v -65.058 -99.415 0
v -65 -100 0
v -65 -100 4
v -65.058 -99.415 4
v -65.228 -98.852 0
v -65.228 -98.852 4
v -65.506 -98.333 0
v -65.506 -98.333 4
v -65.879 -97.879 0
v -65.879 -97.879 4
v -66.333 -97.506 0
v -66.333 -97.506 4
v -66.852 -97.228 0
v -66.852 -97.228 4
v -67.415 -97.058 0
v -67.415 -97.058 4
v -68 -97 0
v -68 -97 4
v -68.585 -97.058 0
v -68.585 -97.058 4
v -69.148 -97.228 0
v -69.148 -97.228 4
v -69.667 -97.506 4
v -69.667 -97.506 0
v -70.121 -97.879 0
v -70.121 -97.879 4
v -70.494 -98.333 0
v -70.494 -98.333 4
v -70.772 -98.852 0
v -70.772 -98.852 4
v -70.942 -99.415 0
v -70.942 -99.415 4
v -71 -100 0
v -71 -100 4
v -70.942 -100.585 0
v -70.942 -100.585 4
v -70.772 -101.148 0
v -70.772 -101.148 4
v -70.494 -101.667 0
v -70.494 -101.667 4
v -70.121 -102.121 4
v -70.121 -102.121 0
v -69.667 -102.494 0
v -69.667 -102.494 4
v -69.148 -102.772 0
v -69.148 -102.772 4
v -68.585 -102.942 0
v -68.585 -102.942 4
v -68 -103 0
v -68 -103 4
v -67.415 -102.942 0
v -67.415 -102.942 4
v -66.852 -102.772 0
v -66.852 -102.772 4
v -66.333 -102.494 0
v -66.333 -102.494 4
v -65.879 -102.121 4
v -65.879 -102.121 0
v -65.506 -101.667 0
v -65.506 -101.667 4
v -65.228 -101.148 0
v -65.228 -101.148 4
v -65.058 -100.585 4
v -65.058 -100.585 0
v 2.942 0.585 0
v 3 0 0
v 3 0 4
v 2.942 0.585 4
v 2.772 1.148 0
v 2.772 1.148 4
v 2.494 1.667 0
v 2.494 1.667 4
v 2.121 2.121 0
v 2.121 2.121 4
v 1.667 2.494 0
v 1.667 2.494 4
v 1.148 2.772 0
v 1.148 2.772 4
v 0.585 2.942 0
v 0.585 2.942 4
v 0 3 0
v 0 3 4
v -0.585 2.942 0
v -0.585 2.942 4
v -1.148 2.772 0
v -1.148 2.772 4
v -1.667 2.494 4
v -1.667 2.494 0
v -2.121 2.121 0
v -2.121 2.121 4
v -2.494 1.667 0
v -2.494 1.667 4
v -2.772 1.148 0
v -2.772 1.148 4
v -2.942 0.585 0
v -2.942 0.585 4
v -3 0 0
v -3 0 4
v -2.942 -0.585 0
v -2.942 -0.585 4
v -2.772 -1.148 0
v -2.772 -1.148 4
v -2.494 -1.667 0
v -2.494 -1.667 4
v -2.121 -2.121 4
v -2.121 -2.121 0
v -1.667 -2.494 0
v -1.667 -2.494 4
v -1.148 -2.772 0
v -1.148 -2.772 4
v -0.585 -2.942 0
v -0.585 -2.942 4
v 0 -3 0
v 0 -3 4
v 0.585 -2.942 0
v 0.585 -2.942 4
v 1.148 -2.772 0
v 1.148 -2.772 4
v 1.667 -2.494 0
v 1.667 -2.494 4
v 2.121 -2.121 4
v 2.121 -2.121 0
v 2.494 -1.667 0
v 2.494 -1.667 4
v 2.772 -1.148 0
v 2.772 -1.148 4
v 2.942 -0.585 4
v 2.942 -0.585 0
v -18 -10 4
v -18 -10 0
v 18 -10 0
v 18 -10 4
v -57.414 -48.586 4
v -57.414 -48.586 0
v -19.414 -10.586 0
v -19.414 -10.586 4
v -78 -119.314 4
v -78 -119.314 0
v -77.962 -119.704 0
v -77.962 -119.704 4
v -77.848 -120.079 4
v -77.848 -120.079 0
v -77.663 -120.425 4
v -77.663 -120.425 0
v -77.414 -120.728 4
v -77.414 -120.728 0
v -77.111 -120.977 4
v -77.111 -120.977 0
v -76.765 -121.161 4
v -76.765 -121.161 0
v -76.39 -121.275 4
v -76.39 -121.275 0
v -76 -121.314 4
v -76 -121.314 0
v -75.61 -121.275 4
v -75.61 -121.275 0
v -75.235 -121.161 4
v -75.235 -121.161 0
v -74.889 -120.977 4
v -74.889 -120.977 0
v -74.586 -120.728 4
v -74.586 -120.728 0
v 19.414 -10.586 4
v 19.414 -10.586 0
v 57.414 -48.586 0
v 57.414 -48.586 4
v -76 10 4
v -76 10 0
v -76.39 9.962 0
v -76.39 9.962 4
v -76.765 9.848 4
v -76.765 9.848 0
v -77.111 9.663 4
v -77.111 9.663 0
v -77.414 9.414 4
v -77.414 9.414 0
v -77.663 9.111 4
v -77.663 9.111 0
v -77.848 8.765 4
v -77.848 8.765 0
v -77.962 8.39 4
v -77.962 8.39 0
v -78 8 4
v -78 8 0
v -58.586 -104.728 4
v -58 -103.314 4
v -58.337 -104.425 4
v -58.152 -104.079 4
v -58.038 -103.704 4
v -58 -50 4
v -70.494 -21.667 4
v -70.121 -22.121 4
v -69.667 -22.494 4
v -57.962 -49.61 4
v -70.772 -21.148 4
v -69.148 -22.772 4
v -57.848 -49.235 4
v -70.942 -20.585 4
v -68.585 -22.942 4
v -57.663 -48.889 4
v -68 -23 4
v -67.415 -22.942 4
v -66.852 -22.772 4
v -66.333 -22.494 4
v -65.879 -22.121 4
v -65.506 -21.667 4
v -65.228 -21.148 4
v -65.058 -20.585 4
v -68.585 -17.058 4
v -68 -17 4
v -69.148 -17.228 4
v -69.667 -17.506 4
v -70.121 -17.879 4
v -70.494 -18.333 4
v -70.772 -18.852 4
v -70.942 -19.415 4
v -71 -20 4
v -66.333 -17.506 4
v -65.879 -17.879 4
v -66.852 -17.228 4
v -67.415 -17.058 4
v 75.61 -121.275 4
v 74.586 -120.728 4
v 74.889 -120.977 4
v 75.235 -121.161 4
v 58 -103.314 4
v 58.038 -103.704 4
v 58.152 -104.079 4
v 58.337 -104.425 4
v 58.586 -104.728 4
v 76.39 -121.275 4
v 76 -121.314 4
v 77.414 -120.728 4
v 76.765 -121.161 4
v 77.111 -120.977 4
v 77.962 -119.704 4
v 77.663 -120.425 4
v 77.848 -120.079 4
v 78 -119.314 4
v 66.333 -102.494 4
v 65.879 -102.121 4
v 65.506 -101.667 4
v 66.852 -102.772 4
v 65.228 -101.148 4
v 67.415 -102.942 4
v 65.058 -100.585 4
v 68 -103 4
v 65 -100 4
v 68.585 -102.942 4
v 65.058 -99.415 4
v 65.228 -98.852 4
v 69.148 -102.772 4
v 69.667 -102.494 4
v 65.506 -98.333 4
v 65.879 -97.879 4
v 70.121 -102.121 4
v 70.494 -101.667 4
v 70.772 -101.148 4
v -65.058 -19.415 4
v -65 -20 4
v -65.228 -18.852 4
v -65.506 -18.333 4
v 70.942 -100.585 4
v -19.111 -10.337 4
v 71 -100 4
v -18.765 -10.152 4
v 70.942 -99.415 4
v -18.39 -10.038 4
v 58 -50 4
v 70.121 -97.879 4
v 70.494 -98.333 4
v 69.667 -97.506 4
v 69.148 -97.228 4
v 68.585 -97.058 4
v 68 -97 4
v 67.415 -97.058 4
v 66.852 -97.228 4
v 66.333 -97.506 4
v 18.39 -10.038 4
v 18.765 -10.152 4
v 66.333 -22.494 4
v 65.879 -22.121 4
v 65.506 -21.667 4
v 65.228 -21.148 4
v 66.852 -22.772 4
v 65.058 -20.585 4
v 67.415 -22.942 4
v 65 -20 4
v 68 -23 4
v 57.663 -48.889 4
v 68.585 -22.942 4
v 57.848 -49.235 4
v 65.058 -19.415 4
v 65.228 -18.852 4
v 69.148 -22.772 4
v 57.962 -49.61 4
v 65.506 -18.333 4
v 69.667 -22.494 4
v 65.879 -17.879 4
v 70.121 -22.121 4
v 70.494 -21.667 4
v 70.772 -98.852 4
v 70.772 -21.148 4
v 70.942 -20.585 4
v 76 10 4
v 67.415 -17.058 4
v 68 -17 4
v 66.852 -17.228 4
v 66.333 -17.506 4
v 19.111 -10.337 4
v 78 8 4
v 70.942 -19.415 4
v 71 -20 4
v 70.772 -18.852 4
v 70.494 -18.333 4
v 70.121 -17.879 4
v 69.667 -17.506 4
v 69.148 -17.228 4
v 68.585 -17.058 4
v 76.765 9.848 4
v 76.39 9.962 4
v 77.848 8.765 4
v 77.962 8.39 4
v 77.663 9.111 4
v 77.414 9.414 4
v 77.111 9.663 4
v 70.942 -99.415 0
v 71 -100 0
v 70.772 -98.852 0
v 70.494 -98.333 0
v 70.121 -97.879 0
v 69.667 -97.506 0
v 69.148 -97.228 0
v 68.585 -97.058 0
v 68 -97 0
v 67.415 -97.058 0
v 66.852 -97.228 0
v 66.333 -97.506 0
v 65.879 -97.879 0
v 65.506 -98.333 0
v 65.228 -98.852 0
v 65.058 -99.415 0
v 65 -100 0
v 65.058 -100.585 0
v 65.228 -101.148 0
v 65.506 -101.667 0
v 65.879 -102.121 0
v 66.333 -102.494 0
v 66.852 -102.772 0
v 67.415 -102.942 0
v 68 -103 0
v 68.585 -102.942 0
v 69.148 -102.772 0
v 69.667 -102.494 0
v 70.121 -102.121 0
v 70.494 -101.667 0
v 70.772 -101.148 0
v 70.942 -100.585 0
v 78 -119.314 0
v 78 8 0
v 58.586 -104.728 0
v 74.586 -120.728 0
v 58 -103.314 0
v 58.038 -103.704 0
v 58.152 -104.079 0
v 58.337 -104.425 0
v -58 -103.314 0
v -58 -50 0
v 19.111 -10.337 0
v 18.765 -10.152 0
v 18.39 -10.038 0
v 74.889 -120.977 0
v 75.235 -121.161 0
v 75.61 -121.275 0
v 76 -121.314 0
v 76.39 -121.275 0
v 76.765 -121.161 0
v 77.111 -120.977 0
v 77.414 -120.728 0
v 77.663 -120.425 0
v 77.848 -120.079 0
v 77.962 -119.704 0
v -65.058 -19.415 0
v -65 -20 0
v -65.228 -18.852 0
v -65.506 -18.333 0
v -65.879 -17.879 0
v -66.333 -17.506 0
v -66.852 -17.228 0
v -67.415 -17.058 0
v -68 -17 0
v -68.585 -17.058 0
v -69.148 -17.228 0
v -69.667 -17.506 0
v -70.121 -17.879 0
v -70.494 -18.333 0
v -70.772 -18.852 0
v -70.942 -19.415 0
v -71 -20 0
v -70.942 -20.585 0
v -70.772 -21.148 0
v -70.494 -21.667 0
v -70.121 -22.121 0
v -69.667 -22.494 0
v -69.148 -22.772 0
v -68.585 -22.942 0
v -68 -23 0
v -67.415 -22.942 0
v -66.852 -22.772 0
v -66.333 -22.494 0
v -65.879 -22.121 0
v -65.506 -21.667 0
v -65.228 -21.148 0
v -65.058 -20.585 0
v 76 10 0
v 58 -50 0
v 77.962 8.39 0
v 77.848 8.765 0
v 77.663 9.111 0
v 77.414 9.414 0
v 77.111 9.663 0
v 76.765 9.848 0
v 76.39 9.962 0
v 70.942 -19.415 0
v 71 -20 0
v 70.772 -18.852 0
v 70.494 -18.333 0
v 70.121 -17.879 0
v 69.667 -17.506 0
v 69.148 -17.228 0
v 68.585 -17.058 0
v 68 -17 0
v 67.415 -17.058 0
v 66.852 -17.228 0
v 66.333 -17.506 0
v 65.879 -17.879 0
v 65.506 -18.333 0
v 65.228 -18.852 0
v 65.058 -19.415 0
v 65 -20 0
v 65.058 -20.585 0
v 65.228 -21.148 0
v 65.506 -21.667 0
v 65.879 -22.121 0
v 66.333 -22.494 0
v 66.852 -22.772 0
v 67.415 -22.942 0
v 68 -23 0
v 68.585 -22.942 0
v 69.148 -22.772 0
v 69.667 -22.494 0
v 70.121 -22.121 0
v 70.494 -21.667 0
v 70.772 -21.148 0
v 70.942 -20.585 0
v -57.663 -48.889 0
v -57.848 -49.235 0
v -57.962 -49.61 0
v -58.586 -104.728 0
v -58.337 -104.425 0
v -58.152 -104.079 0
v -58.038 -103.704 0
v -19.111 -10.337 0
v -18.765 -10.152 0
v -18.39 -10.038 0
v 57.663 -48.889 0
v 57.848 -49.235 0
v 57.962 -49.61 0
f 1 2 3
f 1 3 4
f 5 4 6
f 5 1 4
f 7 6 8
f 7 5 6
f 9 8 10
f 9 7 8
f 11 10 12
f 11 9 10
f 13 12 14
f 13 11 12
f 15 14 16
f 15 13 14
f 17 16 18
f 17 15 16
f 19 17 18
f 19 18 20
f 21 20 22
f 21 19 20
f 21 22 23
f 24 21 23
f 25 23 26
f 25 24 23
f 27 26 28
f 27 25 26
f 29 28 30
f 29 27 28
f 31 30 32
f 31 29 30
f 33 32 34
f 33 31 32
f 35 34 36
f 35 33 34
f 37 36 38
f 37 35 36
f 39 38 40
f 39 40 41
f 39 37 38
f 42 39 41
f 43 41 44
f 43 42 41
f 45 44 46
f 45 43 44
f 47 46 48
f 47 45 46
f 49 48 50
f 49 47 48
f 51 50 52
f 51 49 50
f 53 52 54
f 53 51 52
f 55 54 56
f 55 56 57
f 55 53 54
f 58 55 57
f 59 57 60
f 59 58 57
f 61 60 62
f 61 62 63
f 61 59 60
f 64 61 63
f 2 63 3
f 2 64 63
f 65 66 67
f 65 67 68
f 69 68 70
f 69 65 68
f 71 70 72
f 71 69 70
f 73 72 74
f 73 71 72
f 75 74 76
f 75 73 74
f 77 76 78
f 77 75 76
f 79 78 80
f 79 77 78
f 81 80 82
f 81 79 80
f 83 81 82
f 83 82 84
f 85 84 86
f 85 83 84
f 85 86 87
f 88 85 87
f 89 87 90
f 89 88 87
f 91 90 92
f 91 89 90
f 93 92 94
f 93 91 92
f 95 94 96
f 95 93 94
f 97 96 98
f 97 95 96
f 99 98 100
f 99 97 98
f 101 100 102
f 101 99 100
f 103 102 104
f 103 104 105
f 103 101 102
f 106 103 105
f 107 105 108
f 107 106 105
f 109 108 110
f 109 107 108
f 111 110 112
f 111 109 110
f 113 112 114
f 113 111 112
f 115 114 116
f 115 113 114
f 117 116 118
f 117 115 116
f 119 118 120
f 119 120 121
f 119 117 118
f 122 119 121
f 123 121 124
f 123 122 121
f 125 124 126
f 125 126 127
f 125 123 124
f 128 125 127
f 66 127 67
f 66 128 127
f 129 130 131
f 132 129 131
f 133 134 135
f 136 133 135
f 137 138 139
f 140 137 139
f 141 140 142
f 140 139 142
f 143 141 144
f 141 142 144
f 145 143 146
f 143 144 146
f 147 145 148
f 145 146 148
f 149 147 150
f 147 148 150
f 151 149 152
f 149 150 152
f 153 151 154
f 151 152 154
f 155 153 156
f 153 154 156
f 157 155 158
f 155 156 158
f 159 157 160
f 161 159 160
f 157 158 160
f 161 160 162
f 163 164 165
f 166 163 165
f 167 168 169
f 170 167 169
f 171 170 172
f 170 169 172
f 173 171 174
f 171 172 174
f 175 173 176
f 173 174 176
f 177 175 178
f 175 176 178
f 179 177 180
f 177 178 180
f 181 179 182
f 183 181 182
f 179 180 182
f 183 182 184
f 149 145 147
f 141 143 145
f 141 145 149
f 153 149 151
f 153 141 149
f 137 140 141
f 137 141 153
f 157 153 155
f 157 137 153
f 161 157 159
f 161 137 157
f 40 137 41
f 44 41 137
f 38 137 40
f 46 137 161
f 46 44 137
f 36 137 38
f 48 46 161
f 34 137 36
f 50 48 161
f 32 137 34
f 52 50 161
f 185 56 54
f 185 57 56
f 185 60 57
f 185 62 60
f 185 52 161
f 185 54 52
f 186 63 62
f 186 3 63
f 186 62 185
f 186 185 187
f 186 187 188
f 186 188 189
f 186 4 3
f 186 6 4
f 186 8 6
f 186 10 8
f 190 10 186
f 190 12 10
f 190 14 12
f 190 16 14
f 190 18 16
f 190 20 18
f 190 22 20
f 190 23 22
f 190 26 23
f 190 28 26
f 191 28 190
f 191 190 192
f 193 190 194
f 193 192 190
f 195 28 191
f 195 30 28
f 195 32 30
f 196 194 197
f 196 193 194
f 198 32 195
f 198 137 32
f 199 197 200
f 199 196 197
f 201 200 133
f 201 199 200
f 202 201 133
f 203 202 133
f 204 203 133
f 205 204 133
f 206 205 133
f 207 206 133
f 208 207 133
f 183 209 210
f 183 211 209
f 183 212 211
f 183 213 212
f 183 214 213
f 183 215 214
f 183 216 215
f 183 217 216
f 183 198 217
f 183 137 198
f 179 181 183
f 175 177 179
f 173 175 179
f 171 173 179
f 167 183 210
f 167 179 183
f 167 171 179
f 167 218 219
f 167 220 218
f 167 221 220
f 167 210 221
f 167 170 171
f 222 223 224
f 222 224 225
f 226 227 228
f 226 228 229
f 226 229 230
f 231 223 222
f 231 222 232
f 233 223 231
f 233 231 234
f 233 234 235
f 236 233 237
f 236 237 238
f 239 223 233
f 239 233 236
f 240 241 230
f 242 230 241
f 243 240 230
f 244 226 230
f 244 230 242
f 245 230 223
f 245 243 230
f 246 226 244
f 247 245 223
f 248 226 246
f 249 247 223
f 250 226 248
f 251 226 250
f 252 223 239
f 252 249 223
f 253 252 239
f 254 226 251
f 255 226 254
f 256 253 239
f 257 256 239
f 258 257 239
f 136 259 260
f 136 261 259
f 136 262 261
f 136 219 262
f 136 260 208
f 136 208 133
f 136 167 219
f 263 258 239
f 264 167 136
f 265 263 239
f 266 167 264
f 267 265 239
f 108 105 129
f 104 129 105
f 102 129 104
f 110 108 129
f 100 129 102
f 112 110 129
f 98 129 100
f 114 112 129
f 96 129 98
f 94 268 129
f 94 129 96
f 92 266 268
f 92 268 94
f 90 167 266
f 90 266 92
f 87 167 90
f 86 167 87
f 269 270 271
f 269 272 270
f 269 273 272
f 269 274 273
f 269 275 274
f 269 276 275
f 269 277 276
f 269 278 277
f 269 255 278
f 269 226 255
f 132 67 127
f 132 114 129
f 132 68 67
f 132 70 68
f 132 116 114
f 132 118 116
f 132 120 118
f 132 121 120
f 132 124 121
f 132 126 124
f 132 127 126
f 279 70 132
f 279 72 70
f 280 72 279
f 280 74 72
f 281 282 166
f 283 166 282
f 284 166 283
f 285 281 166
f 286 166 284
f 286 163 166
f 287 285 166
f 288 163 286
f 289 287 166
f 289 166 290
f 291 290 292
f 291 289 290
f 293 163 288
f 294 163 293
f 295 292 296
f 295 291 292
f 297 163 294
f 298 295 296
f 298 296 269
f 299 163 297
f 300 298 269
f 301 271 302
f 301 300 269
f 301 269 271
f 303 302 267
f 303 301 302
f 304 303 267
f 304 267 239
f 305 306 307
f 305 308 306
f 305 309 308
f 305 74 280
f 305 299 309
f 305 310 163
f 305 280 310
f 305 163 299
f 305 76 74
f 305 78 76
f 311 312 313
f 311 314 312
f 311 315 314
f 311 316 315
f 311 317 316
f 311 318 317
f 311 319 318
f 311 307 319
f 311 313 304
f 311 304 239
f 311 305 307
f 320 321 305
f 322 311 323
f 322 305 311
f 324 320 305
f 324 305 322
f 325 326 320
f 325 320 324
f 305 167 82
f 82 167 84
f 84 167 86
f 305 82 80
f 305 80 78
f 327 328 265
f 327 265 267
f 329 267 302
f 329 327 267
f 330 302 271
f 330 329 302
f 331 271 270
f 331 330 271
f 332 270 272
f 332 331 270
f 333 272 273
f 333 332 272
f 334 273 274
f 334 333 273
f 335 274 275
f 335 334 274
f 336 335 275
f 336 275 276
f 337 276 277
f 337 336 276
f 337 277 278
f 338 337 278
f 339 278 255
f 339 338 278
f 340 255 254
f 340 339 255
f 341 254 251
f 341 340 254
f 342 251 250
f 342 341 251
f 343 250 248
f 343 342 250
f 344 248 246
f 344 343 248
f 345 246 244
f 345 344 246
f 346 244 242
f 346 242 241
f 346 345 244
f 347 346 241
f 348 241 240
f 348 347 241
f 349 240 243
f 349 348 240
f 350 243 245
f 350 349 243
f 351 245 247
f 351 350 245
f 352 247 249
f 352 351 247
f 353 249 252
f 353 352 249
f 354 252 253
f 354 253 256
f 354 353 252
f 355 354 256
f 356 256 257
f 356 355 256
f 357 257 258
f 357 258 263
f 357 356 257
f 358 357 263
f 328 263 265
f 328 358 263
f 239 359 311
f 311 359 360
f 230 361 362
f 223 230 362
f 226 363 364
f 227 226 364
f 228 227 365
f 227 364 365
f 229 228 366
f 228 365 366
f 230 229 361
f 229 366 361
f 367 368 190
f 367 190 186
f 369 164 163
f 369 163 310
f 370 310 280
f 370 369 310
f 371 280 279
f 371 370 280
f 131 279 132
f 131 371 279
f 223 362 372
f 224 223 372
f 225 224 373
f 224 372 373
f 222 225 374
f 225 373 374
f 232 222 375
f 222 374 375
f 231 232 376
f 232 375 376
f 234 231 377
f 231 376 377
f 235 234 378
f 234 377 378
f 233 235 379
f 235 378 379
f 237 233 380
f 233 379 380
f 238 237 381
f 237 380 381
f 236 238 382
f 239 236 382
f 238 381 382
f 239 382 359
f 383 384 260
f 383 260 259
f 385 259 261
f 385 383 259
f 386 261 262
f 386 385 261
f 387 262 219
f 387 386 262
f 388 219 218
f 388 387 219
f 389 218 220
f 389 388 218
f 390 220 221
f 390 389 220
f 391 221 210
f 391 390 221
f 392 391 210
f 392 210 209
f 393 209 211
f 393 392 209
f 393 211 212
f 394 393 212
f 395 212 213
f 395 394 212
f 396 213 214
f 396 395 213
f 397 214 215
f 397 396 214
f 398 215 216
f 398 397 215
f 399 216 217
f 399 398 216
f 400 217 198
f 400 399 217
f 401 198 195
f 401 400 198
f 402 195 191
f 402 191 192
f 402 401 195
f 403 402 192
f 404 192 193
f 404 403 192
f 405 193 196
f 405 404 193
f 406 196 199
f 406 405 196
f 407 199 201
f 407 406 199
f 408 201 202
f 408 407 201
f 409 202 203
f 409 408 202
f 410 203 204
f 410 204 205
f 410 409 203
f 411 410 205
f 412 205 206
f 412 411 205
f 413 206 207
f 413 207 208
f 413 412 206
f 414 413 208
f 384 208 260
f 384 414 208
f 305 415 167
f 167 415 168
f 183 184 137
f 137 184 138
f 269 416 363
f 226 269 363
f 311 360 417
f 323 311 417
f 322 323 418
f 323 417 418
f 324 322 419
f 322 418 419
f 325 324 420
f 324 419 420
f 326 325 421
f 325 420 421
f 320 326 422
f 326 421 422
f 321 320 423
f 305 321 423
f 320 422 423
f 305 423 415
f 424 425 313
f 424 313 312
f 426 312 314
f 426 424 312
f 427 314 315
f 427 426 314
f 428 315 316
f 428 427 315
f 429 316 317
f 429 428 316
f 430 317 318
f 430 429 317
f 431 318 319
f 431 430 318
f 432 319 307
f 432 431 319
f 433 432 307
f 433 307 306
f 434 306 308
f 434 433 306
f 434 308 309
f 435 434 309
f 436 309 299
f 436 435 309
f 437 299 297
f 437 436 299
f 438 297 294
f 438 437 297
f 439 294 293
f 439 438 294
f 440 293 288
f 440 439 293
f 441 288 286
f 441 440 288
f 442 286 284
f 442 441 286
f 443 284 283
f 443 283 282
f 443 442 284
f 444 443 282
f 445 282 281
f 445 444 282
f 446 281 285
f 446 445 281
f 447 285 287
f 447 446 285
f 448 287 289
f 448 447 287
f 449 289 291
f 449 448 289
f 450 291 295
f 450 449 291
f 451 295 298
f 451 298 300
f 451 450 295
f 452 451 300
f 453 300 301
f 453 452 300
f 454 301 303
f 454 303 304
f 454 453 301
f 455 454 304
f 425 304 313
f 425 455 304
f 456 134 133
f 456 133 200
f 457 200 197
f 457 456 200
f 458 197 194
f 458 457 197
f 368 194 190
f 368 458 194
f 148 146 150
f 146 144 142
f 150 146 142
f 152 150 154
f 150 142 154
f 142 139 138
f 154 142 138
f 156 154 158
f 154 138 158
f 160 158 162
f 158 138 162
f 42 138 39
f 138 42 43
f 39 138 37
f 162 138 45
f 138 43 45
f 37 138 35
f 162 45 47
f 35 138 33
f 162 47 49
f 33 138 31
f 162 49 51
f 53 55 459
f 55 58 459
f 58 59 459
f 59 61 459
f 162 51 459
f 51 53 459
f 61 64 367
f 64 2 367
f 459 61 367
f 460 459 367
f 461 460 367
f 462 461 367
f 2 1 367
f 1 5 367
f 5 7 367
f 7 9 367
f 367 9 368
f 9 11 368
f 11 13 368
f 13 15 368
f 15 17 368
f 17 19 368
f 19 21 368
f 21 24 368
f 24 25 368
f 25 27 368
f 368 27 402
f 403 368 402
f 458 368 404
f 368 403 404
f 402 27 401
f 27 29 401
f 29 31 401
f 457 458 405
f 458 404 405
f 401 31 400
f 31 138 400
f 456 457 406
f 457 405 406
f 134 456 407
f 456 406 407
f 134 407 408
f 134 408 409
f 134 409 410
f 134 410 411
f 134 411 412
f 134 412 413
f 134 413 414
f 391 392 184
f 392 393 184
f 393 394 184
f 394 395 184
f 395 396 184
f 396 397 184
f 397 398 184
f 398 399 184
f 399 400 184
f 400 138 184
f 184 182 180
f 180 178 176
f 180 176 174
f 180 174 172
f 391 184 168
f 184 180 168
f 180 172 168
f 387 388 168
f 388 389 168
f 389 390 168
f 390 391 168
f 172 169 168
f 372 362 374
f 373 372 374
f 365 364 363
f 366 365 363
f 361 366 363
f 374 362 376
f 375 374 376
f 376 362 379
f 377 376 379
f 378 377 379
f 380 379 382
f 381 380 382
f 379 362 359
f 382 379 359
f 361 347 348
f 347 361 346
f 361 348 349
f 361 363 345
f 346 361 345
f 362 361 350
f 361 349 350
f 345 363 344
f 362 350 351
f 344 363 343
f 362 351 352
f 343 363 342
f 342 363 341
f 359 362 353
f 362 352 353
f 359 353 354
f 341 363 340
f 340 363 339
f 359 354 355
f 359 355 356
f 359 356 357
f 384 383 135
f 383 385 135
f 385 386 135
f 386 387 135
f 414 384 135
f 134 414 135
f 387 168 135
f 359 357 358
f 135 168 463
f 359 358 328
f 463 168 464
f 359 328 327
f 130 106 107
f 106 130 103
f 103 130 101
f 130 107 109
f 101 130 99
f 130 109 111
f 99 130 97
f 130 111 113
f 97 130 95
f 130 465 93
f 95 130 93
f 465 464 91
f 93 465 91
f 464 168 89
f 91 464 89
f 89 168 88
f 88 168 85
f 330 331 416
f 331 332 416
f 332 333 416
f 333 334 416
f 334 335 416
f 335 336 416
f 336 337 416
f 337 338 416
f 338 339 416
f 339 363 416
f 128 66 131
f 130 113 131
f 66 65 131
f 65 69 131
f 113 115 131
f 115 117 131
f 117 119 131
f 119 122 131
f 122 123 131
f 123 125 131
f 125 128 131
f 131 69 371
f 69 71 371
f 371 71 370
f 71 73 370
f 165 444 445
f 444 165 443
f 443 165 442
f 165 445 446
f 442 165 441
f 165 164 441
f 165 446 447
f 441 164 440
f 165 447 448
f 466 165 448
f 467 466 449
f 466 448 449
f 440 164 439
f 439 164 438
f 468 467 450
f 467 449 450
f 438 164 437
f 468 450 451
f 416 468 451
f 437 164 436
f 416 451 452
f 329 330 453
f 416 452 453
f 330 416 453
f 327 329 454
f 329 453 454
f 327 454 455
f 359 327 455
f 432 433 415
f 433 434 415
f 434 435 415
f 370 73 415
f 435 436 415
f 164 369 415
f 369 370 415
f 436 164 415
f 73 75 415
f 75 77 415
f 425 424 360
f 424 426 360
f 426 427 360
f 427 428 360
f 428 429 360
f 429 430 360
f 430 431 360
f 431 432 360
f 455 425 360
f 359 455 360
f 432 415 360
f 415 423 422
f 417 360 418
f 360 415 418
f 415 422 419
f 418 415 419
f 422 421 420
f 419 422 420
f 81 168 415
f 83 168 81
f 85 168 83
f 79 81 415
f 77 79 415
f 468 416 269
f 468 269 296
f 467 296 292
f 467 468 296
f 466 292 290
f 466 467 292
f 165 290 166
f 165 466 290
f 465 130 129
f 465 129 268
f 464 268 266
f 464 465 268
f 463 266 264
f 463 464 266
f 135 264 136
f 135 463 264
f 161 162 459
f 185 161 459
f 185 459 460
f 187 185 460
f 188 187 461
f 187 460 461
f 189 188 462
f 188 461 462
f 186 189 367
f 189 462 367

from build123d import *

# Parameters (mm, degrees)
SKETCH_R  = 3
PAD_DEPTH = 4


with BuildPart() as part:
    # Sketch → Pad (new body)
    with BuildSketch(Plane.XY):
        with BuildLine():
            Line((-78, 8), (-78, -119.313708))
            ThreePointArc((-78, -119.313708), (-76.765367, -121.161468), (-74.585786, -120.727922))
            Line((-74.585786, -120.727922), (-58.585786, -104.727922))
            ThreePointArc((-58.585786, -104.727922), (-58.152241, -104.079075), (-58, -103.313708))
            Line((-58, -50), (-58, -103.313708))
            ThreePointArc((-57.414214, -48.585786), (-57.847759, -49.234633), (-58, -50))
            Line((-57.414214, -48.585786), (-19.414214, -10.585786))
            ThreePointArc((-18, -10), (-18.765367, -10.152241), (-19.414214, -10.585786))
            Line((-18, -10), (18, -10))
            ThreePointArc((19.414214, -10.585786), (18.765367, -10.152241), (18, -10))
            Line((19.414214, -10.585786), (57.414214, -48.585786))
            ThreePointArc((58, -50), (57.847759, -49.234633), (57.414214, -48.585786))
            Line((58, -50), (58, -103.313708))
            ThreePointArc((58, -103.313708), (58.152241, -104.079075), (58.585786, -104.727922))
            Line((58.585786, -104.727922), (74.585786, -120.727922))
            ThreePointArc((74.585786, -120.727922), (76.765367, -121.161468), (78, -119.313708))
            Line((78, -119.313708), (78, 8))
            ThreePointArc((78, 8), (77.414214, 9.414214), (76, 10))
            Line((76, 10), (-76, 10))
            ThreePointArc((-76, 10), (-77.414214, 9.414214), (-78, 8))
        make_face()
        with Locations((-68, -20)):
            Circle(SKETCH_R, mode=Mode.SUBTRACT)
        with Locations((-68, -100)):
            Circle(SKETCH_R, mode=Mode.SUBTRACT)
        with Locations((68, -20)):
            Circle(SKETCH_R, mode=Mode.SUBTRACT)
        with Locations((68, -100)):
            Circle(SKETCH_R, mode=Mode.SUBTRACT)
        Circle(SKETCH_R, mode=Mode.SUBTRACT)
    extrude(amount=PAD_DEPTH)


solid = part.part
